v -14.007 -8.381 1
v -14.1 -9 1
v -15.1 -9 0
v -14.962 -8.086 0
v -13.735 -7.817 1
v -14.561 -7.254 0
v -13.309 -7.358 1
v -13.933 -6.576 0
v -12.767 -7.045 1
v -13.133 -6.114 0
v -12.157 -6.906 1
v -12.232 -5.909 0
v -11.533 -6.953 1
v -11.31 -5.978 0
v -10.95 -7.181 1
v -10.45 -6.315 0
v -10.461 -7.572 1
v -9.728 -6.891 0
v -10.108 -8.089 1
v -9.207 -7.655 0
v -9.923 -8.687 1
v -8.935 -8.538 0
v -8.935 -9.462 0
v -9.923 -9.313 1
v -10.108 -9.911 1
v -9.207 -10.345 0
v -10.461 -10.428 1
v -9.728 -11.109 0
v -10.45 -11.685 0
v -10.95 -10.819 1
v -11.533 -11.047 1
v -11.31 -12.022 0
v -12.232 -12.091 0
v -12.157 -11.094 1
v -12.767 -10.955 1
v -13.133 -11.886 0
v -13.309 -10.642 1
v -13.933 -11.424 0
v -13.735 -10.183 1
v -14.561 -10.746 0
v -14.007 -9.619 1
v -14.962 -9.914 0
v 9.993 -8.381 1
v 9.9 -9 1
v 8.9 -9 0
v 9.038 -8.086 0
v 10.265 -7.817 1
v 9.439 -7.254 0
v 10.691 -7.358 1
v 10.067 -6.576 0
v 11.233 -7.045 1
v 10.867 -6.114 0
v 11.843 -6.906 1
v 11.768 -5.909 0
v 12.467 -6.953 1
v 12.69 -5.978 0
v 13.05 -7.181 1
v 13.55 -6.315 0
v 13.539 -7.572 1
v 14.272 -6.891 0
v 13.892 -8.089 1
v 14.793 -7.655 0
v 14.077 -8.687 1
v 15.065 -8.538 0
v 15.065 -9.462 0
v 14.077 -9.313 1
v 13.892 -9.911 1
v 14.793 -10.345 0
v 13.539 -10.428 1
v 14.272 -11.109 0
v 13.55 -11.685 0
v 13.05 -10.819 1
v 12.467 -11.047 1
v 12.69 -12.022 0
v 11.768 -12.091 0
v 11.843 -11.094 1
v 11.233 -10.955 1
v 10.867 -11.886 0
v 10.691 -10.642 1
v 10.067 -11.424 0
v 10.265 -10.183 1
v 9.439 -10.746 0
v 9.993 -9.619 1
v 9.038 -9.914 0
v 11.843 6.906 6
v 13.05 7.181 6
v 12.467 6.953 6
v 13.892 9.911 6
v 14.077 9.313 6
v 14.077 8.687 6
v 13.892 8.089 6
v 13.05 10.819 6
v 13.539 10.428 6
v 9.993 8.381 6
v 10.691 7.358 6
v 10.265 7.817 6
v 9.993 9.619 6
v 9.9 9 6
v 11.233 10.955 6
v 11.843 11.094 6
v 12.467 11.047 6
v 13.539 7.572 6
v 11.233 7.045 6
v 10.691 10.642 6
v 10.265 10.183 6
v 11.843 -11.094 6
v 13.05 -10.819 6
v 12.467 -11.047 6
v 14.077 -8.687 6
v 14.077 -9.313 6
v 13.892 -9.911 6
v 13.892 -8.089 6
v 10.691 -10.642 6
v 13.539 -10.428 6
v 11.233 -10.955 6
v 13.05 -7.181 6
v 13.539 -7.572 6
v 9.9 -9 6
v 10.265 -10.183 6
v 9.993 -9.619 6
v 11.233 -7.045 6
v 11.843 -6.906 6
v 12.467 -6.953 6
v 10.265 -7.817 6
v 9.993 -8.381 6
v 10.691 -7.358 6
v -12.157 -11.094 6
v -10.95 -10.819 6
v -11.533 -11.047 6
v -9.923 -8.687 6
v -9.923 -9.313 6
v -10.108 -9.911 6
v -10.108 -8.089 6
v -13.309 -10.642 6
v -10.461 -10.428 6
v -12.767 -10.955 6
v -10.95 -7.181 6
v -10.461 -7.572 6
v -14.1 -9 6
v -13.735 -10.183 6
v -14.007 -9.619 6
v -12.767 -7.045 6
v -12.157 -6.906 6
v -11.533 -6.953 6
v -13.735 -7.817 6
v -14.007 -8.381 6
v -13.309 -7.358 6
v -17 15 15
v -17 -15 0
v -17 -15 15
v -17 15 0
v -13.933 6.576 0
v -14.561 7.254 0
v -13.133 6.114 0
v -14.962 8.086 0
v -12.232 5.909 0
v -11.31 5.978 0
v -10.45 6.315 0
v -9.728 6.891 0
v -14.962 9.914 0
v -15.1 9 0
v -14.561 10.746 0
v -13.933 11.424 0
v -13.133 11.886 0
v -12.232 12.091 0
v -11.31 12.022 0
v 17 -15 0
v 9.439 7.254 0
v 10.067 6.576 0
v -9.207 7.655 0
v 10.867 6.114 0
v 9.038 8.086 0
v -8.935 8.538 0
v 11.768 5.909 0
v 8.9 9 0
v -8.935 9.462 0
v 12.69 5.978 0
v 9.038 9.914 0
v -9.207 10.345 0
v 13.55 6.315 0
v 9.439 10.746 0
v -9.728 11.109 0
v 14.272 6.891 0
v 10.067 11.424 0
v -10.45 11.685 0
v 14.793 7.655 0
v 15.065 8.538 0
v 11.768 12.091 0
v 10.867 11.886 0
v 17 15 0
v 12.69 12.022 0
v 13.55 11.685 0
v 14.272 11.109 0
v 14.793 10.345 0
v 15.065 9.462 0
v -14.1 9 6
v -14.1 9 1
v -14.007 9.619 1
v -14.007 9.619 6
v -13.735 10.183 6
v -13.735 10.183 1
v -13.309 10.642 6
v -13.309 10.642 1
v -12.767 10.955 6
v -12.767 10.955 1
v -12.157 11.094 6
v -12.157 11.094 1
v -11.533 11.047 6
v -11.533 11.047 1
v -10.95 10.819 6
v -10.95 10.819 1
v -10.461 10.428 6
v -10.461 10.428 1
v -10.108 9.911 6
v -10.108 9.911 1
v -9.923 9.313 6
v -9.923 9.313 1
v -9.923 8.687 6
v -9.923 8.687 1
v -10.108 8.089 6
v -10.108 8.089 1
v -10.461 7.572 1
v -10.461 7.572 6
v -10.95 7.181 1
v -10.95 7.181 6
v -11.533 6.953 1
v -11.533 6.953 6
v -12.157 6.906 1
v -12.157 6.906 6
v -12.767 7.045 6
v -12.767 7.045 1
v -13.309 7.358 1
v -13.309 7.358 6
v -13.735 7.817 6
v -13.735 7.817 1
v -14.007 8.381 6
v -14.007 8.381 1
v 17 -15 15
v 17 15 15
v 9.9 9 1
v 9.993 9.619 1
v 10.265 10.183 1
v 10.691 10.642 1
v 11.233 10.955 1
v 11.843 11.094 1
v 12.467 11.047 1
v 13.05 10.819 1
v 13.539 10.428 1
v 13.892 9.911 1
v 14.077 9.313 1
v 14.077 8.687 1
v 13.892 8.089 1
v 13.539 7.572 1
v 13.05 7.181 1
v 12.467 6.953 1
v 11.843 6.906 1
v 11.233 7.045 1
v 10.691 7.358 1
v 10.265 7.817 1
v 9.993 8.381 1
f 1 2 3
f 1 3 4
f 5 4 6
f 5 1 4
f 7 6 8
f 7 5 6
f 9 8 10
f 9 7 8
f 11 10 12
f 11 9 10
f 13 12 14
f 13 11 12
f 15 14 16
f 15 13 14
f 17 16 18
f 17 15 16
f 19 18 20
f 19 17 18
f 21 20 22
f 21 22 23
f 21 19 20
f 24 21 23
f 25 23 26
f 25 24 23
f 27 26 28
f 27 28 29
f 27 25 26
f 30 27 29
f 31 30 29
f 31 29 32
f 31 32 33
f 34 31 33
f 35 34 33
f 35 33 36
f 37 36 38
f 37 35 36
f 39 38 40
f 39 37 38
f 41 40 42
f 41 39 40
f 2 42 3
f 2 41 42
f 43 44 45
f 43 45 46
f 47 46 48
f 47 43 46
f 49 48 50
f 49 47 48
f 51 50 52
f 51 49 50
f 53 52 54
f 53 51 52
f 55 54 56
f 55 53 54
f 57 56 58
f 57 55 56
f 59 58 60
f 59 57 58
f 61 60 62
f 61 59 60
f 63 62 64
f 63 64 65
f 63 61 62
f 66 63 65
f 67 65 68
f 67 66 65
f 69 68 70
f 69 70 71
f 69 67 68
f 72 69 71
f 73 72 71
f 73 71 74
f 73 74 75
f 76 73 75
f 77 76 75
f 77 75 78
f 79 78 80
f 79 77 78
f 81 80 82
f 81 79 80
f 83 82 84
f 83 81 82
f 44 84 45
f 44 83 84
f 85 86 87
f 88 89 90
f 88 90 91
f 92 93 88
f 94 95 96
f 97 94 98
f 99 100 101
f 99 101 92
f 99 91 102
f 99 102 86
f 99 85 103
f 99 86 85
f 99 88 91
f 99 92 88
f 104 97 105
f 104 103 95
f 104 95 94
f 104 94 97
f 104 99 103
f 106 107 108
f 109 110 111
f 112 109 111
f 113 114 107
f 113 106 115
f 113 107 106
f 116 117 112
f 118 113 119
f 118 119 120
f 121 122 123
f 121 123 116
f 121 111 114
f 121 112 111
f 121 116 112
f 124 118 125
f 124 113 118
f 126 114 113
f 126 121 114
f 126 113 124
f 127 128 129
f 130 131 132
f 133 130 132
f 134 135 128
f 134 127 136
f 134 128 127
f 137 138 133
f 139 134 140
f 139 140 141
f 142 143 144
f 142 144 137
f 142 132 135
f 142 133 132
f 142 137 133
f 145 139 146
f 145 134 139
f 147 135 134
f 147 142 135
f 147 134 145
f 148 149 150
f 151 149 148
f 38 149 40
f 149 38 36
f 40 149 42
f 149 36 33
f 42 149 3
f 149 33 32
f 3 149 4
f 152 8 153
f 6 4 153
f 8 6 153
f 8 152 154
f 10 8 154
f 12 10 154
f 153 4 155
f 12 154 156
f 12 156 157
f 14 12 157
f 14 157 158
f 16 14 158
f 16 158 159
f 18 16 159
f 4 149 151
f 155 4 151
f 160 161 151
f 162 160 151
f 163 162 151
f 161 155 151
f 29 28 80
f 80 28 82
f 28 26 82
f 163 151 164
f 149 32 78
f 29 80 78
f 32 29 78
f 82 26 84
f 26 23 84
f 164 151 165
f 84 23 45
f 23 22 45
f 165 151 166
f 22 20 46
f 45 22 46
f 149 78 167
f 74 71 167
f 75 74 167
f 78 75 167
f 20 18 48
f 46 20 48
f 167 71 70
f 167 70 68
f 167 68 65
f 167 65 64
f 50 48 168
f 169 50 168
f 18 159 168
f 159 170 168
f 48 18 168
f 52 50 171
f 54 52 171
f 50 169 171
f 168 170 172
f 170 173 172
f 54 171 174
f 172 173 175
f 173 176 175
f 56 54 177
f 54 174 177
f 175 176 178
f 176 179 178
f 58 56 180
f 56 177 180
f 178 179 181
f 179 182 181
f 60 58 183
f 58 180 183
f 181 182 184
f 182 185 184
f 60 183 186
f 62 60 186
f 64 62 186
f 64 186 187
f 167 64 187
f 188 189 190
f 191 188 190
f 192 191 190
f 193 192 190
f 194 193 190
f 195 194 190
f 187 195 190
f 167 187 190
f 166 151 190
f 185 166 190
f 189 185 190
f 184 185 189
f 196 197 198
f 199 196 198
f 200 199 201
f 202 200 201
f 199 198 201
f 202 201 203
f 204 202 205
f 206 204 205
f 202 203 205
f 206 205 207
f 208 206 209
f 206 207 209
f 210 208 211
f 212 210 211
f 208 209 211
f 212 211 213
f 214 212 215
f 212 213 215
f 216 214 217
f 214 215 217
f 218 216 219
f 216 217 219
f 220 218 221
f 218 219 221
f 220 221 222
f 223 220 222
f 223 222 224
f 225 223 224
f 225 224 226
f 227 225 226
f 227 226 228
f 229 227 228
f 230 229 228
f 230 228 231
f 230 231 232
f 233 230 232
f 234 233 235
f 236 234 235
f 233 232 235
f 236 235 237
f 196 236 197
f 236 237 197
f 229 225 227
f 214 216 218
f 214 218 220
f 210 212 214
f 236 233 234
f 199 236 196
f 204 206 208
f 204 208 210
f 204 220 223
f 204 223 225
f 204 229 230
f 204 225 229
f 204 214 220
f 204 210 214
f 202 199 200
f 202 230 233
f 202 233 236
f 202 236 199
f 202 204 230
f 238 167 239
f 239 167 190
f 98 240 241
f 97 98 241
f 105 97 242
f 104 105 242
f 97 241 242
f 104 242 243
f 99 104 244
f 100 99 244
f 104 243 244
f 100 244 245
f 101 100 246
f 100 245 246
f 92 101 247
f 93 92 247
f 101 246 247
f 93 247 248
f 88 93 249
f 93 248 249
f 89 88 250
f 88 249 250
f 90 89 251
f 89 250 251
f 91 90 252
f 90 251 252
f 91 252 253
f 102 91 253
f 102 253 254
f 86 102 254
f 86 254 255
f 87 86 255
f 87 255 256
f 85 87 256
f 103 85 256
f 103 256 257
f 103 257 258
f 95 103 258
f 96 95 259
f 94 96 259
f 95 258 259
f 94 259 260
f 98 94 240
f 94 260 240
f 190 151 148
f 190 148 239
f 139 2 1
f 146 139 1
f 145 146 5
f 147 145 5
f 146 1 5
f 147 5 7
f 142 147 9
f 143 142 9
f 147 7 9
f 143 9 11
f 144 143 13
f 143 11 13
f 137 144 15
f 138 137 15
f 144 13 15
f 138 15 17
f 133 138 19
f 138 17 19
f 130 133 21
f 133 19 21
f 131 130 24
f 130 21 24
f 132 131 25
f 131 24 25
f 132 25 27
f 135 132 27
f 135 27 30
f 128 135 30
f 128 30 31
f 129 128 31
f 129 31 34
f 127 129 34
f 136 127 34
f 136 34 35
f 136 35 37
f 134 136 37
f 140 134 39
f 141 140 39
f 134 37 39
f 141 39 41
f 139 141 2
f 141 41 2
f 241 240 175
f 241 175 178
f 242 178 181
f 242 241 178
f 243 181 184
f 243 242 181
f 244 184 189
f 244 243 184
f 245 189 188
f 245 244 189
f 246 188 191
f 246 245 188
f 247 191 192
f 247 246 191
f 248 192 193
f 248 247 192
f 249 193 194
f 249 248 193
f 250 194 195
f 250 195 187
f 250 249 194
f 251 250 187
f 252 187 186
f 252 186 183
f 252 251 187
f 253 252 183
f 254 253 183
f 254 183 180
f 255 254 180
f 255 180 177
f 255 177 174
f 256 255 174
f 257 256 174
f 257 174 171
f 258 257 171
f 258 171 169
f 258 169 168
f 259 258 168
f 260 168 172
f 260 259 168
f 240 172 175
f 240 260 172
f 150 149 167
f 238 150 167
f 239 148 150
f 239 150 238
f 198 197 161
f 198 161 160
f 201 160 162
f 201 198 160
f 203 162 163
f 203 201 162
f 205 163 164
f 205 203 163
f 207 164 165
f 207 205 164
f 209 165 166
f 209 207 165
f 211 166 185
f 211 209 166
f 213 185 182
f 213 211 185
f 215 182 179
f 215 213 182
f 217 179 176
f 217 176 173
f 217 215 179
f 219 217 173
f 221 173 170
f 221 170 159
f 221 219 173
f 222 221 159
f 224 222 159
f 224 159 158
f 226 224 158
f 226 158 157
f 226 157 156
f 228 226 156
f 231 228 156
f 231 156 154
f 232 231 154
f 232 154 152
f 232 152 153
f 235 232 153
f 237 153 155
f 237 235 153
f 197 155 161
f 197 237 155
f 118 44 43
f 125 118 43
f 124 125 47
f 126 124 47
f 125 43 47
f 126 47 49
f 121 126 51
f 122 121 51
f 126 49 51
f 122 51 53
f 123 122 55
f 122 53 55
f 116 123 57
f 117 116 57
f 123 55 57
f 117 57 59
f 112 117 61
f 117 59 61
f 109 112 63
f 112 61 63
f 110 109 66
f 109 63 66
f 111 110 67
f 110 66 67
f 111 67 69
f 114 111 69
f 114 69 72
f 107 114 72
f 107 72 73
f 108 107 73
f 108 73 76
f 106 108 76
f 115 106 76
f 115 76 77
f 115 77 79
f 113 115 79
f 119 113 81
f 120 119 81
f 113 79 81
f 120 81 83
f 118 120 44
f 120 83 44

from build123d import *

# Parameters (mm, degrees)
SKETCH1_W           = 34
SKETCH1_H           = 30
BOSS_EXTRUDE1_DEPTH = 15
SKETCH2_R           = 2.1
CUT_EXTRUDE1_DEPTH  = 6
CHAMFER1_SIZE       = 1


with BuildPart() as part:
    # Sketch1 → Boss-Extrude1 (new body)
    with BuildSketch(Plane.XY):
        Rectangle(SKETCH1_W, SKETCH1_H)
    extrude(amount=BOSS_EXTRUDE1_DEPTH)

    # Sketch2 → Cut-Extrude1 (cut)
    with BuildSketch(Plane(origin=(0, 0, 0), x_dir=(-1, 0, 0), z_dir=(0, 0, -1))):
        with Locations((12, -9)):
            Circle(SKETCH2_R)
        with Locations((12, 9)):
            Circle(SKETCH2_R)
        with Locations((-12, 9)):
            Circle(SKETCH2_R)
        with Locations((-12, -9)):
            Circle(SKETCH2_R)
    extrude(amount=-CUT_EXTRUDE1_DEPTH, mode=Mode.SUBTRACT)

    # Chamfer1
    chamfer1_edges = [part.edges().sort_by_distance(p)[0] for p in [
        (14.1, -9, 0),
        (14.1, 9, 0),
        (-9.9, 9, 0),
        (-9.9, -9, 0),
    ]]
    chamfer(chamfer1_edges, length=CHAMFER1_SIZE)


solid = part.part
